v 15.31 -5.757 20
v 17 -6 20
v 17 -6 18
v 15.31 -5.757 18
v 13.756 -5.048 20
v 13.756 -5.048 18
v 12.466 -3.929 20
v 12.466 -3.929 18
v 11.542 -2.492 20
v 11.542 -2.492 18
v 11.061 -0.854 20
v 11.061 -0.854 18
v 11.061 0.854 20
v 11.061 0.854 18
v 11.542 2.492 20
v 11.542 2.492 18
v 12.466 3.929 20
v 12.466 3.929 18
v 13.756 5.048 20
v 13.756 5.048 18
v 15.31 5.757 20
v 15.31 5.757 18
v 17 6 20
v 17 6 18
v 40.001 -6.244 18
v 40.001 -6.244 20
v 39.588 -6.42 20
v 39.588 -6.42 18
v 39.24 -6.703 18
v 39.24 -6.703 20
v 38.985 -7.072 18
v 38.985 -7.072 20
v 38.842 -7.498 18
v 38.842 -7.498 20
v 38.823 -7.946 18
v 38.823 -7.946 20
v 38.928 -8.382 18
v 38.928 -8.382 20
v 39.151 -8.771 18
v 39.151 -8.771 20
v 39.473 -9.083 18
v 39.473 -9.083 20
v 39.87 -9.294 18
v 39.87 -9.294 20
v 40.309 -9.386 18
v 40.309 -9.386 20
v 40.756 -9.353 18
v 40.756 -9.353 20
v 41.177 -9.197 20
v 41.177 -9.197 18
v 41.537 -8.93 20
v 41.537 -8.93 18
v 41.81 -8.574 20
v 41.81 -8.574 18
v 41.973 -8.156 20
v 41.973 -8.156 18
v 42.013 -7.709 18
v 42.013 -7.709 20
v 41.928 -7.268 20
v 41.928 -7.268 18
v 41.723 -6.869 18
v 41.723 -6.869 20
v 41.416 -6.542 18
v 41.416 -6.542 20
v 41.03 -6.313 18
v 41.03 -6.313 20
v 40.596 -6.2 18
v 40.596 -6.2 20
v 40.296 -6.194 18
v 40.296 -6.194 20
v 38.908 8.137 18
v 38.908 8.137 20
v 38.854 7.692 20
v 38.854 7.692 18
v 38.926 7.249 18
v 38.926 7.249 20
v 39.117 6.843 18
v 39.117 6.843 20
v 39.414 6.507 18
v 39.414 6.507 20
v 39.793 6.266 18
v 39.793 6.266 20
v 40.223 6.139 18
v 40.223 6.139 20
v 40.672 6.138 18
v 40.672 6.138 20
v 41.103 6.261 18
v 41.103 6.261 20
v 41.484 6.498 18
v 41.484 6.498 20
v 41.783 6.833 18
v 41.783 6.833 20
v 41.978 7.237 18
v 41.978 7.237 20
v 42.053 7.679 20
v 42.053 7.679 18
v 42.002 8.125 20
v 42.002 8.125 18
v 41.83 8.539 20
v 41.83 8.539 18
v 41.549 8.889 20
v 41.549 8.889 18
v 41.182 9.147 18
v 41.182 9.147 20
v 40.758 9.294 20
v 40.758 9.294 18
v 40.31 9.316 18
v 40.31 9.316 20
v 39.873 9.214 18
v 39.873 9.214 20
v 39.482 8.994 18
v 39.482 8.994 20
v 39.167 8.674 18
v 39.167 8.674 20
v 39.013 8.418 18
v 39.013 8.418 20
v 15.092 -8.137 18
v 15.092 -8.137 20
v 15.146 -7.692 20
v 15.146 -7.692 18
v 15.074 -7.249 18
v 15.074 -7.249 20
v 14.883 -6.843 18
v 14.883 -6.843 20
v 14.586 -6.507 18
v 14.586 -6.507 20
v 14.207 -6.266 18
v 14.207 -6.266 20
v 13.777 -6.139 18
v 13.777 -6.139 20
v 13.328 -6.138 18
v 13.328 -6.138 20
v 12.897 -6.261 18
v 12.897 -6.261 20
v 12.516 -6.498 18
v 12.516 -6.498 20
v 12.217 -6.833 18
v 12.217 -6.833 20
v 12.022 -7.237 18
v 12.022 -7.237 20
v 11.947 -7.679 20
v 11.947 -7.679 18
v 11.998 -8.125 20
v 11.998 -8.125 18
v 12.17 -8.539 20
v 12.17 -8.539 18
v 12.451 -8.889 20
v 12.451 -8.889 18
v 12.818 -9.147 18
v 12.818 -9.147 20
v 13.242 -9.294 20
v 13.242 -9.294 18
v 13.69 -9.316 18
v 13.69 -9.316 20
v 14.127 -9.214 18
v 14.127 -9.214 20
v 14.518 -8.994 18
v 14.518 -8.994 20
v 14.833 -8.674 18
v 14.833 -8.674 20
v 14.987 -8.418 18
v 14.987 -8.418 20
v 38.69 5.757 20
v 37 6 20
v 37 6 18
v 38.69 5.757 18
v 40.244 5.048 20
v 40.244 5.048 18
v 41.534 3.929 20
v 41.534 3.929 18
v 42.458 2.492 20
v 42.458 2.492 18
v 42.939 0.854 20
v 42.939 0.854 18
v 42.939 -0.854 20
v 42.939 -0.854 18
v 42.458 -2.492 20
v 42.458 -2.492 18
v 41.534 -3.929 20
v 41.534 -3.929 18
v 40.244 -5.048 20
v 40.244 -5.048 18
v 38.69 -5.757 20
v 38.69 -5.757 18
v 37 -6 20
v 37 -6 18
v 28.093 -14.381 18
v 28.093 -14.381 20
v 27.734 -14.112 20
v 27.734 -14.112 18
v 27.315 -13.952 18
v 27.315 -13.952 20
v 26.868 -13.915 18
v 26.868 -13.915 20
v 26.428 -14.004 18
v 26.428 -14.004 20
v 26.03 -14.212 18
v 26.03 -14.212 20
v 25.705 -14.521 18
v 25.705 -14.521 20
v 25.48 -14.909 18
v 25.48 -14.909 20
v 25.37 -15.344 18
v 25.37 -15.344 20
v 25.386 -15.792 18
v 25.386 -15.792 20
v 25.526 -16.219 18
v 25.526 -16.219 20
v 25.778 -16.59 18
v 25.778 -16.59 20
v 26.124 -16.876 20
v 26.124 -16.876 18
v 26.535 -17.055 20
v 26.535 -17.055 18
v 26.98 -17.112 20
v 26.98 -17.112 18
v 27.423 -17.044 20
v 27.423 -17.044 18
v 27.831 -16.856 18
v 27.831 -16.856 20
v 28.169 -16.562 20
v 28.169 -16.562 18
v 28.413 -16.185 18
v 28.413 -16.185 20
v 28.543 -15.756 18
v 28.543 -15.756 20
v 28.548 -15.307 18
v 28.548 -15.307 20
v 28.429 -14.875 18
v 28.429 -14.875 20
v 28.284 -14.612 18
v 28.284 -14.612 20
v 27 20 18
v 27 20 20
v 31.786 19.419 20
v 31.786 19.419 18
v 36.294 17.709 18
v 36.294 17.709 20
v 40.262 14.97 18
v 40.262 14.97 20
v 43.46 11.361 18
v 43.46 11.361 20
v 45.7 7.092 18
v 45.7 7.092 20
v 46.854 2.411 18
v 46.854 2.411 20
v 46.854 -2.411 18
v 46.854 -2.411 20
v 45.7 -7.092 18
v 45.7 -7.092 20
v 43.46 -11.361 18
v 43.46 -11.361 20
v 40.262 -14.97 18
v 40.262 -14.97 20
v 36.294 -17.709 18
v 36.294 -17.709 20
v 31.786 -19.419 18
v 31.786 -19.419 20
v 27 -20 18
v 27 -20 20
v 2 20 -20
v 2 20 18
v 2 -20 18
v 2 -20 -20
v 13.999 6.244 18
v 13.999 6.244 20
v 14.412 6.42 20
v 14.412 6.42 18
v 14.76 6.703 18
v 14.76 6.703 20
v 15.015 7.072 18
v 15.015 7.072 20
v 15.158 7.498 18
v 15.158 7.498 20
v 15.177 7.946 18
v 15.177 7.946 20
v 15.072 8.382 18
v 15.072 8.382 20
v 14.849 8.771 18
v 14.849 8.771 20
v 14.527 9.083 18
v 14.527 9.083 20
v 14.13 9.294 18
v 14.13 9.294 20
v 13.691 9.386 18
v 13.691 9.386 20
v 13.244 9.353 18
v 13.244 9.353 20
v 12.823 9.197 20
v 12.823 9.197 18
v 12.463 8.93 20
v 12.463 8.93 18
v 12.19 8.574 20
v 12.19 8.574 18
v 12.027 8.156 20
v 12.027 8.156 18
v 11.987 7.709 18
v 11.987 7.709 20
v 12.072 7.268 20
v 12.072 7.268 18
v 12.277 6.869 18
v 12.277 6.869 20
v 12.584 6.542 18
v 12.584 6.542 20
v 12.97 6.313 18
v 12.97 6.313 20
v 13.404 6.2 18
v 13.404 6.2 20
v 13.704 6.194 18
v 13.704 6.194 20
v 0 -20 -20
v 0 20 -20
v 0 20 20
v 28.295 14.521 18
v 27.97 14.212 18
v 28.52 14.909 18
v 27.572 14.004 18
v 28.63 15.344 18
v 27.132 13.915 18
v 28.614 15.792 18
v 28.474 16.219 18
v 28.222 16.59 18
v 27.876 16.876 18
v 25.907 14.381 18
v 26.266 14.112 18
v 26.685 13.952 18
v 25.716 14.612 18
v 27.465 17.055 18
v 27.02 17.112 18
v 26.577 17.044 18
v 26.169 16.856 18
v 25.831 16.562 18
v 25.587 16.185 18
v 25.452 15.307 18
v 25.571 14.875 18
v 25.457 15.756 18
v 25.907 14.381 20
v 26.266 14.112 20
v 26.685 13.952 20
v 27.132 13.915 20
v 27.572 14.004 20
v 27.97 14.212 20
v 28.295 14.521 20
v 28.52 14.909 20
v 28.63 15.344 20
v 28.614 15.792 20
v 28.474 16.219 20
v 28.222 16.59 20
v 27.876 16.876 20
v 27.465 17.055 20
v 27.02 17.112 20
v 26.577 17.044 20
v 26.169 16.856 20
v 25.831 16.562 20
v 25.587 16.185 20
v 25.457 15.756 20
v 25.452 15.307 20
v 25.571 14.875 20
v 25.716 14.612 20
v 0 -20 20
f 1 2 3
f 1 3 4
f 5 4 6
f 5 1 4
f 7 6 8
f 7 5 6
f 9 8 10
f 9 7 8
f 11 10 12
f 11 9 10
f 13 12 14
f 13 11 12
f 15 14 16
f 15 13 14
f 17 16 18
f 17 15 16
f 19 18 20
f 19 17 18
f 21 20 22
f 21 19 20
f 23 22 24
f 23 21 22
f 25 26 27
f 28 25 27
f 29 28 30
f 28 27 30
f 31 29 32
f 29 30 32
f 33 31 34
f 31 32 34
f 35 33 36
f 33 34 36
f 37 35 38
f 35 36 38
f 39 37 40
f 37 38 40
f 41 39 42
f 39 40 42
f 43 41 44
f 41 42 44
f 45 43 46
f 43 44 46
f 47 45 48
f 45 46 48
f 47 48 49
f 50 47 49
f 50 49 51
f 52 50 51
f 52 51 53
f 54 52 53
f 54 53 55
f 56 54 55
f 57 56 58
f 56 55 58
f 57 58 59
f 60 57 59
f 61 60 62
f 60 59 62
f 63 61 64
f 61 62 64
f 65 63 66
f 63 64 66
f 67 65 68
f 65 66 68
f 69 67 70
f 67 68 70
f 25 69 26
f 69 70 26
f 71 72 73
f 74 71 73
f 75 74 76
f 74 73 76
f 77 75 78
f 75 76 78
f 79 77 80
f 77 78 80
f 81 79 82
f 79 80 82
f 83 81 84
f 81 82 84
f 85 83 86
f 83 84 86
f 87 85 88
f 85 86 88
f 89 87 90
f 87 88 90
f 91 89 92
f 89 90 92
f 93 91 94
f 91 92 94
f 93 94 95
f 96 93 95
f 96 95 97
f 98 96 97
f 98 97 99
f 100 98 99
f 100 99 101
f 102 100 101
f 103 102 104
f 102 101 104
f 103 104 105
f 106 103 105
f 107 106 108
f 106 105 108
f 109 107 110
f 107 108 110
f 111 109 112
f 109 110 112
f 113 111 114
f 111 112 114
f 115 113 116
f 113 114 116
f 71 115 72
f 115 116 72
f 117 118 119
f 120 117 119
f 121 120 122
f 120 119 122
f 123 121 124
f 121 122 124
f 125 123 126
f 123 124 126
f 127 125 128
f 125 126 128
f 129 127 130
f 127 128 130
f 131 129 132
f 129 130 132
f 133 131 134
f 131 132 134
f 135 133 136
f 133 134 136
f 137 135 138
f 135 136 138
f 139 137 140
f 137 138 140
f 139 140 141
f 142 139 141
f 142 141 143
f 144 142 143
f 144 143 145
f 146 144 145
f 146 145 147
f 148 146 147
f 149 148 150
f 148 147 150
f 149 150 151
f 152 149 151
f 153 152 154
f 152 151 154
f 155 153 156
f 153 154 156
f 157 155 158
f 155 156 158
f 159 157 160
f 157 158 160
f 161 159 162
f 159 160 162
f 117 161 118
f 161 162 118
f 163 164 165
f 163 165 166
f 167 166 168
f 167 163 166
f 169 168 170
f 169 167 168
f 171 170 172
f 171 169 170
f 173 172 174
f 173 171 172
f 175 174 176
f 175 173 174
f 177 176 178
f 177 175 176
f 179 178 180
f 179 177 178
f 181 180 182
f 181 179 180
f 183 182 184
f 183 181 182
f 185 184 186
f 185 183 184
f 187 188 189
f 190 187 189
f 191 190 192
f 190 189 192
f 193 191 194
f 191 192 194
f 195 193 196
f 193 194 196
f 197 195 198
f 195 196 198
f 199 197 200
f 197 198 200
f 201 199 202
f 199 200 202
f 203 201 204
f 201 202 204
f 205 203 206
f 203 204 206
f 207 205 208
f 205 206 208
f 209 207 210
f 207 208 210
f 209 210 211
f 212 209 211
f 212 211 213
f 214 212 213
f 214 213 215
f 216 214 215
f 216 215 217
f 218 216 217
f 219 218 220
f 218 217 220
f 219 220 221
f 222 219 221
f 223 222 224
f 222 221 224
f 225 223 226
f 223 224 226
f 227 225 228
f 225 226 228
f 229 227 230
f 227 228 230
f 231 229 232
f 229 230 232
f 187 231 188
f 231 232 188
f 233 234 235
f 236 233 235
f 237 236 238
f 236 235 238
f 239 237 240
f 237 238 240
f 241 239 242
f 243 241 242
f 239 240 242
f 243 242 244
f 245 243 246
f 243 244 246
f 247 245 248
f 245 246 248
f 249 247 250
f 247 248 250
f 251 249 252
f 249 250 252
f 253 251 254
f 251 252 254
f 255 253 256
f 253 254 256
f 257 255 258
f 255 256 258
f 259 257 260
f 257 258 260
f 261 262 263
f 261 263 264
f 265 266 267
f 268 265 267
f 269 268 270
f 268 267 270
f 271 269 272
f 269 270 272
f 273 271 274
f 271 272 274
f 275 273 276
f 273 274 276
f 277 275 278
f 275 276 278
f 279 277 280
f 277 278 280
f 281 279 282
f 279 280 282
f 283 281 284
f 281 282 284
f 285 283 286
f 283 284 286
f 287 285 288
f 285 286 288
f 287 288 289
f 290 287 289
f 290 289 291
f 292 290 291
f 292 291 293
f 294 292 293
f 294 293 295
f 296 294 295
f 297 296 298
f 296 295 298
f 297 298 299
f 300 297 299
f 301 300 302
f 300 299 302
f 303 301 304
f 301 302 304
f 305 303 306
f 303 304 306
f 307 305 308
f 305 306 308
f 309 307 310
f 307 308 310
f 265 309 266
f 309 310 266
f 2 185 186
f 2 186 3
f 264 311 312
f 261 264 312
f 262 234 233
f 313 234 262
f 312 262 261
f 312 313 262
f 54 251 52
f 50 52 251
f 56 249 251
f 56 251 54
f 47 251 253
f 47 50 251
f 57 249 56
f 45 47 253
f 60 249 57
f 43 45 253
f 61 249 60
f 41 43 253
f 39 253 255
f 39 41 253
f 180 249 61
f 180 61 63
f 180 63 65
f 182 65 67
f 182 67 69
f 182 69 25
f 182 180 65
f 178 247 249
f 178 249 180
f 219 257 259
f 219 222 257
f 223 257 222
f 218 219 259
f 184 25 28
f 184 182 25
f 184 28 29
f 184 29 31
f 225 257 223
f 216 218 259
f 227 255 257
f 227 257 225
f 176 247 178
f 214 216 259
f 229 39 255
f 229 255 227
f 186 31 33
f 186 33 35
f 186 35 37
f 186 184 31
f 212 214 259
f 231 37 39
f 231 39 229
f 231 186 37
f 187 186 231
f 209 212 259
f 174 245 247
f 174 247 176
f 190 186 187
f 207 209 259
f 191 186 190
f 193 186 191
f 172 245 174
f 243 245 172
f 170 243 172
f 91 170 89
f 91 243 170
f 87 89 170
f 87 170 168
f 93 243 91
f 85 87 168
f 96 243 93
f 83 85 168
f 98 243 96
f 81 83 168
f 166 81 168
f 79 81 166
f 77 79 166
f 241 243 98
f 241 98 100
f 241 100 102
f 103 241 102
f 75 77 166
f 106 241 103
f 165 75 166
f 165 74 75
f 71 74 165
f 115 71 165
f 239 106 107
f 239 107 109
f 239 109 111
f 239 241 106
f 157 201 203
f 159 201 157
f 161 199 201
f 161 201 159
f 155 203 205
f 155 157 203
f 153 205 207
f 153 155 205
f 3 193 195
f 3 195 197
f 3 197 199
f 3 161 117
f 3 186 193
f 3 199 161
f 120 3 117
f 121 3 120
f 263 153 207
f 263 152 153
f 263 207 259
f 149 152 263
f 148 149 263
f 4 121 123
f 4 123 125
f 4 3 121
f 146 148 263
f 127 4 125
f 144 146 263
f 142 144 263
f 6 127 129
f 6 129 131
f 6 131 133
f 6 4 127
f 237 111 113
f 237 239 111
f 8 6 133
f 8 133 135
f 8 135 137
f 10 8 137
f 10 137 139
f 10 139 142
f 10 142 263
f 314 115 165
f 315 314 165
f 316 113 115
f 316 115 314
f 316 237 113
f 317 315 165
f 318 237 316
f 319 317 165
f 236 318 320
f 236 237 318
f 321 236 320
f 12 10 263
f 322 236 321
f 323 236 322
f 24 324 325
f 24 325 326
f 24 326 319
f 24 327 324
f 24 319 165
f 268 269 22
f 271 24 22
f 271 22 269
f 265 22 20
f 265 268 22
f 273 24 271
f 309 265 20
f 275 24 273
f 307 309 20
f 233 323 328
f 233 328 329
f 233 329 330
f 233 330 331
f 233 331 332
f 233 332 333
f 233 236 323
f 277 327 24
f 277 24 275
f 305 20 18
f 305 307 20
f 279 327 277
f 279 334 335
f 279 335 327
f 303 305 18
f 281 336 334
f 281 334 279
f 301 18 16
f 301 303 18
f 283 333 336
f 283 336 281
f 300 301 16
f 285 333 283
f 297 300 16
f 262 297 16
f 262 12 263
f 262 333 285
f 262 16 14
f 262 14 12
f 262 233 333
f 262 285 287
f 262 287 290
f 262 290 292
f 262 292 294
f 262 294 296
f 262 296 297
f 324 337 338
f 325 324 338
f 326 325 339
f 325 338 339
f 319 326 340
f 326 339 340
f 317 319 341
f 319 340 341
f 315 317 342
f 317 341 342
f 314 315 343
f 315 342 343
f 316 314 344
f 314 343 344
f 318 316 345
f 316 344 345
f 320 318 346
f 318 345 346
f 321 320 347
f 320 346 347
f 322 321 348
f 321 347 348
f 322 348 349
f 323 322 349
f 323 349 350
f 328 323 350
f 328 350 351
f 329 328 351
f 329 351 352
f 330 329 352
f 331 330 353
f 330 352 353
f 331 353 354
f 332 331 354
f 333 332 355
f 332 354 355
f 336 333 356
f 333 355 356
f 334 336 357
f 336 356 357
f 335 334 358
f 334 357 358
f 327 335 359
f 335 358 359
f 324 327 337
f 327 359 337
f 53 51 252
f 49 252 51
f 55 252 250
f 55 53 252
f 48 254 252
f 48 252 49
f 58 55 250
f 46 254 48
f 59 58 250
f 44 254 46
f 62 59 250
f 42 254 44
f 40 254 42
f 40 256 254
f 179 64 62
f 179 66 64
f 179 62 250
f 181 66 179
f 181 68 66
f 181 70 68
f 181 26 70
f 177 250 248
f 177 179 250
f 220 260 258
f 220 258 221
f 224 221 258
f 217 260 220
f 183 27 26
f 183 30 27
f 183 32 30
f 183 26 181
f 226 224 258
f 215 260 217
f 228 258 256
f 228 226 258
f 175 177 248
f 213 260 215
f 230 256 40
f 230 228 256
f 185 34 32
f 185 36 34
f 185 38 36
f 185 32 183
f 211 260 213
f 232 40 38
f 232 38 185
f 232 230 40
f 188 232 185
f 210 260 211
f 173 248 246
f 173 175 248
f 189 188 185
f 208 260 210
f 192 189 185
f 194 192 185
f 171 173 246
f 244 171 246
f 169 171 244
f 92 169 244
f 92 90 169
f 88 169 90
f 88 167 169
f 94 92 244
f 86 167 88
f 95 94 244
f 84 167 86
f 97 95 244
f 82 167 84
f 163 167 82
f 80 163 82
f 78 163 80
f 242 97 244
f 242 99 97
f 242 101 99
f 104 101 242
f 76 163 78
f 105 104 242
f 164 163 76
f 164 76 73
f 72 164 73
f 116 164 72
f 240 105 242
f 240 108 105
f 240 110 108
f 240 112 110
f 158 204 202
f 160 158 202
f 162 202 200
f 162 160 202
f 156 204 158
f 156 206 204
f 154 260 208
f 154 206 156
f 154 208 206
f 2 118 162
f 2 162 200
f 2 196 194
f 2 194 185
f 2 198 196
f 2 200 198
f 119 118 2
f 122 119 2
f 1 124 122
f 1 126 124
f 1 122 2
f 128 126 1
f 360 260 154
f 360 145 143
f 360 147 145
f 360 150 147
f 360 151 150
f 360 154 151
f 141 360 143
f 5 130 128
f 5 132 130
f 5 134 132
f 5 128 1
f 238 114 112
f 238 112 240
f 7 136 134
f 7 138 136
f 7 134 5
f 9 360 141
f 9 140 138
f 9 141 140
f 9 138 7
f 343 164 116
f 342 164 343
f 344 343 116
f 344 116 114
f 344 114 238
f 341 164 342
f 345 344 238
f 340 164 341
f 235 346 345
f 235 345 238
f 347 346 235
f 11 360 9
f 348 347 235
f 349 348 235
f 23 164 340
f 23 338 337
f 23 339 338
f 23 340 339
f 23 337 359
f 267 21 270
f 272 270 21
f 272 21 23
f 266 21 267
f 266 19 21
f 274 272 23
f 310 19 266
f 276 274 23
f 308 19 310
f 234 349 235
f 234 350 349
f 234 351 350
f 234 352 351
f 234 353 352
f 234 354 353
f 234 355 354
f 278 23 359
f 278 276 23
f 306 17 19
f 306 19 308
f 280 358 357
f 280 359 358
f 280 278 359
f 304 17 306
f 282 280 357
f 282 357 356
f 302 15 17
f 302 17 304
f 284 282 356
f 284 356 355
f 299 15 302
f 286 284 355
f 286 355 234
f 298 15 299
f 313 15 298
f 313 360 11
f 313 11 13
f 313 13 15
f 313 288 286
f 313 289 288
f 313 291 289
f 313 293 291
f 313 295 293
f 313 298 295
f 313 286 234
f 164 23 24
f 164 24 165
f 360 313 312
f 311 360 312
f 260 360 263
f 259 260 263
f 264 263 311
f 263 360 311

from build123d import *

# Parameters (mm, degrees)
SKETCH_1_W               = 40
SKETCH_1_H               = 40
EXTRUDE_1_DEPTH          = 2
EXTRUDE_2_DEPTH          = 2
SKETCH_3_4_RX            = 1.6
SKETCH_3_4_RY            = 1.6
CUT_EXTRUDE_1_DEPTH      = 2
PATTERN_CIRCULAR_1_COUNT = 6
CUT_EXTRUDE_2_DEPTH      = 65.876806333


with BuildPart() as part:
    # 草图1 → 凸台-拉伸1 (new body)
    with BuildSketch(Plane(origin=(0, 0, 0), x_dir=(0, 0, -1), z_dir=(1, 0, 0))):
        Rectangle(SKETCH_1_W, SKETCH_1_H)
    extrude(amount=EXTRUDE_1_DEPTH)

    # 草图3 → 凸台-拉伸2 (add)
    with BuildSketch(Plane.XY.offset(20)):
        with BuildLine():
            Line((0, 20), (27, 20))
            ThreePointArc((27, 20), (47, 0), (27, -20))
            Line((27, -20), (0, -20))
            Line((0, -20), (0, 20))
        make_face()
    extrude(amount=-EXTRUDE_2_DEPTH)

    # 草图3<4> → 切除-拉伸1 (cut)
    with BuildSketch(Plane.XY.offset(20)):
        with Locations(Location((27.038693052, 15.512584913), (0, 0, 225))):
            Ellipse(SKETCH_3_4_RX, SKETCH_3_4_RY)
    cut_extrude_1 = extrude(amount=-CUT_EXTRUDE_1_DEPTH, mode=Mode.SUBTRACT)

    # 阵列(圆周)1: 切除-拉伸1 ×6 about axis
    pattern_circular_1_axis = Axis((27, 0, 0), (0, 0, 1))
    for i in range(1, PATTERN_CIRCULAR_1_COUNT):
        add(cut_extrude_1.rotate(pattern_circular_1_axis, i * 360 / PATTERN_CIRCULAR_1_COUNT), mode=Mode.SUBTRACT)

    # 草图3<5> → 切除-拉伸2 (cut, through all)
    with BuildSketch(Plane.XY.offset(20)):
        with BuildLine():
            Line((37, -6), (17, -6))
            ThreePointArc((17, -6), (11, 0), (17, 6))
            Line((17, 6), (37, 6))
            ThreePointArc((37, 6), (43, 0), (37, -6))
        make_face()
    extrude(amount=-CUT_EXTRUDE_2_DEPTH, mode=Mode.SUBTRACT)


solid = part.part
